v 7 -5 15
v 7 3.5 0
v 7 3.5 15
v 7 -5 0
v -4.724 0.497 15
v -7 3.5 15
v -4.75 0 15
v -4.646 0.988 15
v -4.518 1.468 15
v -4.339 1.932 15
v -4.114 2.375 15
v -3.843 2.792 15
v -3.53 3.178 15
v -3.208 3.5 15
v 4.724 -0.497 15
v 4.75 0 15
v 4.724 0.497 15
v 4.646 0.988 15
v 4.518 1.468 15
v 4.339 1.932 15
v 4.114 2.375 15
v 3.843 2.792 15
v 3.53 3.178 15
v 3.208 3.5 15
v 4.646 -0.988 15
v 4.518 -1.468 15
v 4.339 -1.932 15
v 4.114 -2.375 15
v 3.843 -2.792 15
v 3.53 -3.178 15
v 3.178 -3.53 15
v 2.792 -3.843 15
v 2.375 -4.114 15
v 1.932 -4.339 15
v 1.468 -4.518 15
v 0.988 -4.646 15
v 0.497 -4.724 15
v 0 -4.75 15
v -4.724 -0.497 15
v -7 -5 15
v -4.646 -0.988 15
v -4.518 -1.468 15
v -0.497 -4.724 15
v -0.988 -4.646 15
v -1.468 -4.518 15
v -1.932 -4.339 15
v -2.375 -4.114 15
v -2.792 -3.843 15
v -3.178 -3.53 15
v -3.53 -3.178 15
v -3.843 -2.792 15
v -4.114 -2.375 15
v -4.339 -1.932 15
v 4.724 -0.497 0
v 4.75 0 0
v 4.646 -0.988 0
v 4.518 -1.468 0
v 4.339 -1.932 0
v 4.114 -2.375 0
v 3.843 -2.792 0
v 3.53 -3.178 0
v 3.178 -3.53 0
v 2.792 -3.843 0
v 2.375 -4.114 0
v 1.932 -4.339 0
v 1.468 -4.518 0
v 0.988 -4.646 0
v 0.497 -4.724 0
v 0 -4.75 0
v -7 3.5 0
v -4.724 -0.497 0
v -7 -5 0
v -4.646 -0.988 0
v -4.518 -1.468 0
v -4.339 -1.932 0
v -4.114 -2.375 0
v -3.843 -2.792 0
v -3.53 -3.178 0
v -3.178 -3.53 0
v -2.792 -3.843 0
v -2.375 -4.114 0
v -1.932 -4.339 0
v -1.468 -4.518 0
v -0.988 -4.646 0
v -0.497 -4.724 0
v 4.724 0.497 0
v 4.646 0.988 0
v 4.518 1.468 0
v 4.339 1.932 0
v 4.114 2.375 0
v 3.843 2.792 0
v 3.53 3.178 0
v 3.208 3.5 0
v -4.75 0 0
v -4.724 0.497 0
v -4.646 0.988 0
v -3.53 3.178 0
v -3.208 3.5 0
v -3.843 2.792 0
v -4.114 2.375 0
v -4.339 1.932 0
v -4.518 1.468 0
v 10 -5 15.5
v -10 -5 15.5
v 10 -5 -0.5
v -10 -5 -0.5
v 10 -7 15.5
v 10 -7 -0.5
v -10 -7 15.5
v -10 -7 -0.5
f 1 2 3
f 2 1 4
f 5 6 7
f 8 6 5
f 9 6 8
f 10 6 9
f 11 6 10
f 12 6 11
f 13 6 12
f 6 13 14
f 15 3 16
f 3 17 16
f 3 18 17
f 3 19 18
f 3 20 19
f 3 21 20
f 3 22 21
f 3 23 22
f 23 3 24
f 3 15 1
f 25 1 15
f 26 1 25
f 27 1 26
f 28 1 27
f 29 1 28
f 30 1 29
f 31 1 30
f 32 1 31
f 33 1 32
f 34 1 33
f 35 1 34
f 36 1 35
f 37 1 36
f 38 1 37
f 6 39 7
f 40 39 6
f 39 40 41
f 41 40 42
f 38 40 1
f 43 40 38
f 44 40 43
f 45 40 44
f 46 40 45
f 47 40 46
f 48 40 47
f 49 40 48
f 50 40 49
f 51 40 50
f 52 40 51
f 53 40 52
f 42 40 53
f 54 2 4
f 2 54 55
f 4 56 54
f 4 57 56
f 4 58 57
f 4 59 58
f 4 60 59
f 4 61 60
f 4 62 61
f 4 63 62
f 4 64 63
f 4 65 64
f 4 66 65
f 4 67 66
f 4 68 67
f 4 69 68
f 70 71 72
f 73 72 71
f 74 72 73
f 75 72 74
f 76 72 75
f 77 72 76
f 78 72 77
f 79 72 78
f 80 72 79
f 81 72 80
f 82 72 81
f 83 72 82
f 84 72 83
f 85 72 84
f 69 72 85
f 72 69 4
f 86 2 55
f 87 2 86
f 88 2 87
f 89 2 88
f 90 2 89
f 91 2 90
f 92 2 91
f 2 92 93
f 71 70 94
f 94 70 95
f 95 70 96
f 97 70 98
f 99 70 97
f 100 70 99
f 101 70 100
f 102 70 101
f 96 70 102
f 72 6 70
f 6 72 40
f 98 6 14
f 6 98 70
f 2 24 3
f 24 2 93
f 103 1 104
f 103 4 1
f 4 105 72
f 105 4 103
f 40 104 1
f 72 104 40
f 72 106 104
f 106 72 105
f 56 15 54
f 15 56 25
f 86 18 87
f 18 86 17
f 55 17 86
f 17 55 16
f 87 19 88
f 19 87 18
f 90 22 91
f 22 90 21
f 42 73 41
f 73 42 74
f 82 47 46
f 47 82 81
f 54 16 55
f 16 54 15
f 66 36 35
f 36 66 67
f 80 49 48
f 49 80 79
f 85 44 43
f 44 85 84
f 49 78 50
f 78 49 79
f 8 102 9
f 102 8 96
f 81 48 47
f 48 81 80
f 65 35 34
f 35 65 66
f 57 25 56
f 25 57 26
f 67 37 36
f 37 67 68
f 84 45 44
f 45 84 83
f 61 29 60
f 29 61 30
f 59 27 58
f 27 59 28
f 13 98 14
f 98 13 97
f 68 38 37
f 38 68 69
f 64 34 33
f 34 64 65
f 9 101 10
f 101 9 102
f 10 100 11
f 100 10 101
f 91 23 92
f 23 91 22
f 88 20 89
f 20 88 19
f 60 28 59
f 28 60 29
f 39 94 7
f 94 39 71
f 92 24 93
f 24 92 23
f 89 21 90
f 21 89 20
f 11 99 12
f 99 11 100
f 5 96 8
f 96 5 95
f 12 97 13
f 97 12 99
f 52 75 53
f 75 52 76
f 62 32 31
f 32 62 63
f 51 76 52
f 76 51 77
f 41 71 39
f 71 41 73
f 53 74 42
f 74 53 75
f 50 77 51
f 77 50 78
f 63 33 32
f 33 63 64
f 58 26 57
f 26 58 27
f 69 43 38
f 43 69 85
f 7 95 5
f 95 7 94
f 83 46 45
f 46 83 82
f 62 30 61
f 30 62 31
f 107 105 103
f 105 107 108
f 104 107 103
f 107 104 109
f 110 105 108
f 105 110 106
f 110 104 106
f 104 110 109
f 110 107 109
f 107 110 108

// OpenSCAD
//wall clip for 9mm OD silicone vacuum hose

$fa = 1;
$fs = 0.5;


//clip
difference() {

translate(v = [-7,-5,0]){
color("red")
cube(size = [14,8.5,15], center = false);
}

cylinder(h = 16, d = 9.5, center = false);
}

//backplate
translate(v = [-10,-7,-0.5])
cube(size = [20,2,16], center = false);
